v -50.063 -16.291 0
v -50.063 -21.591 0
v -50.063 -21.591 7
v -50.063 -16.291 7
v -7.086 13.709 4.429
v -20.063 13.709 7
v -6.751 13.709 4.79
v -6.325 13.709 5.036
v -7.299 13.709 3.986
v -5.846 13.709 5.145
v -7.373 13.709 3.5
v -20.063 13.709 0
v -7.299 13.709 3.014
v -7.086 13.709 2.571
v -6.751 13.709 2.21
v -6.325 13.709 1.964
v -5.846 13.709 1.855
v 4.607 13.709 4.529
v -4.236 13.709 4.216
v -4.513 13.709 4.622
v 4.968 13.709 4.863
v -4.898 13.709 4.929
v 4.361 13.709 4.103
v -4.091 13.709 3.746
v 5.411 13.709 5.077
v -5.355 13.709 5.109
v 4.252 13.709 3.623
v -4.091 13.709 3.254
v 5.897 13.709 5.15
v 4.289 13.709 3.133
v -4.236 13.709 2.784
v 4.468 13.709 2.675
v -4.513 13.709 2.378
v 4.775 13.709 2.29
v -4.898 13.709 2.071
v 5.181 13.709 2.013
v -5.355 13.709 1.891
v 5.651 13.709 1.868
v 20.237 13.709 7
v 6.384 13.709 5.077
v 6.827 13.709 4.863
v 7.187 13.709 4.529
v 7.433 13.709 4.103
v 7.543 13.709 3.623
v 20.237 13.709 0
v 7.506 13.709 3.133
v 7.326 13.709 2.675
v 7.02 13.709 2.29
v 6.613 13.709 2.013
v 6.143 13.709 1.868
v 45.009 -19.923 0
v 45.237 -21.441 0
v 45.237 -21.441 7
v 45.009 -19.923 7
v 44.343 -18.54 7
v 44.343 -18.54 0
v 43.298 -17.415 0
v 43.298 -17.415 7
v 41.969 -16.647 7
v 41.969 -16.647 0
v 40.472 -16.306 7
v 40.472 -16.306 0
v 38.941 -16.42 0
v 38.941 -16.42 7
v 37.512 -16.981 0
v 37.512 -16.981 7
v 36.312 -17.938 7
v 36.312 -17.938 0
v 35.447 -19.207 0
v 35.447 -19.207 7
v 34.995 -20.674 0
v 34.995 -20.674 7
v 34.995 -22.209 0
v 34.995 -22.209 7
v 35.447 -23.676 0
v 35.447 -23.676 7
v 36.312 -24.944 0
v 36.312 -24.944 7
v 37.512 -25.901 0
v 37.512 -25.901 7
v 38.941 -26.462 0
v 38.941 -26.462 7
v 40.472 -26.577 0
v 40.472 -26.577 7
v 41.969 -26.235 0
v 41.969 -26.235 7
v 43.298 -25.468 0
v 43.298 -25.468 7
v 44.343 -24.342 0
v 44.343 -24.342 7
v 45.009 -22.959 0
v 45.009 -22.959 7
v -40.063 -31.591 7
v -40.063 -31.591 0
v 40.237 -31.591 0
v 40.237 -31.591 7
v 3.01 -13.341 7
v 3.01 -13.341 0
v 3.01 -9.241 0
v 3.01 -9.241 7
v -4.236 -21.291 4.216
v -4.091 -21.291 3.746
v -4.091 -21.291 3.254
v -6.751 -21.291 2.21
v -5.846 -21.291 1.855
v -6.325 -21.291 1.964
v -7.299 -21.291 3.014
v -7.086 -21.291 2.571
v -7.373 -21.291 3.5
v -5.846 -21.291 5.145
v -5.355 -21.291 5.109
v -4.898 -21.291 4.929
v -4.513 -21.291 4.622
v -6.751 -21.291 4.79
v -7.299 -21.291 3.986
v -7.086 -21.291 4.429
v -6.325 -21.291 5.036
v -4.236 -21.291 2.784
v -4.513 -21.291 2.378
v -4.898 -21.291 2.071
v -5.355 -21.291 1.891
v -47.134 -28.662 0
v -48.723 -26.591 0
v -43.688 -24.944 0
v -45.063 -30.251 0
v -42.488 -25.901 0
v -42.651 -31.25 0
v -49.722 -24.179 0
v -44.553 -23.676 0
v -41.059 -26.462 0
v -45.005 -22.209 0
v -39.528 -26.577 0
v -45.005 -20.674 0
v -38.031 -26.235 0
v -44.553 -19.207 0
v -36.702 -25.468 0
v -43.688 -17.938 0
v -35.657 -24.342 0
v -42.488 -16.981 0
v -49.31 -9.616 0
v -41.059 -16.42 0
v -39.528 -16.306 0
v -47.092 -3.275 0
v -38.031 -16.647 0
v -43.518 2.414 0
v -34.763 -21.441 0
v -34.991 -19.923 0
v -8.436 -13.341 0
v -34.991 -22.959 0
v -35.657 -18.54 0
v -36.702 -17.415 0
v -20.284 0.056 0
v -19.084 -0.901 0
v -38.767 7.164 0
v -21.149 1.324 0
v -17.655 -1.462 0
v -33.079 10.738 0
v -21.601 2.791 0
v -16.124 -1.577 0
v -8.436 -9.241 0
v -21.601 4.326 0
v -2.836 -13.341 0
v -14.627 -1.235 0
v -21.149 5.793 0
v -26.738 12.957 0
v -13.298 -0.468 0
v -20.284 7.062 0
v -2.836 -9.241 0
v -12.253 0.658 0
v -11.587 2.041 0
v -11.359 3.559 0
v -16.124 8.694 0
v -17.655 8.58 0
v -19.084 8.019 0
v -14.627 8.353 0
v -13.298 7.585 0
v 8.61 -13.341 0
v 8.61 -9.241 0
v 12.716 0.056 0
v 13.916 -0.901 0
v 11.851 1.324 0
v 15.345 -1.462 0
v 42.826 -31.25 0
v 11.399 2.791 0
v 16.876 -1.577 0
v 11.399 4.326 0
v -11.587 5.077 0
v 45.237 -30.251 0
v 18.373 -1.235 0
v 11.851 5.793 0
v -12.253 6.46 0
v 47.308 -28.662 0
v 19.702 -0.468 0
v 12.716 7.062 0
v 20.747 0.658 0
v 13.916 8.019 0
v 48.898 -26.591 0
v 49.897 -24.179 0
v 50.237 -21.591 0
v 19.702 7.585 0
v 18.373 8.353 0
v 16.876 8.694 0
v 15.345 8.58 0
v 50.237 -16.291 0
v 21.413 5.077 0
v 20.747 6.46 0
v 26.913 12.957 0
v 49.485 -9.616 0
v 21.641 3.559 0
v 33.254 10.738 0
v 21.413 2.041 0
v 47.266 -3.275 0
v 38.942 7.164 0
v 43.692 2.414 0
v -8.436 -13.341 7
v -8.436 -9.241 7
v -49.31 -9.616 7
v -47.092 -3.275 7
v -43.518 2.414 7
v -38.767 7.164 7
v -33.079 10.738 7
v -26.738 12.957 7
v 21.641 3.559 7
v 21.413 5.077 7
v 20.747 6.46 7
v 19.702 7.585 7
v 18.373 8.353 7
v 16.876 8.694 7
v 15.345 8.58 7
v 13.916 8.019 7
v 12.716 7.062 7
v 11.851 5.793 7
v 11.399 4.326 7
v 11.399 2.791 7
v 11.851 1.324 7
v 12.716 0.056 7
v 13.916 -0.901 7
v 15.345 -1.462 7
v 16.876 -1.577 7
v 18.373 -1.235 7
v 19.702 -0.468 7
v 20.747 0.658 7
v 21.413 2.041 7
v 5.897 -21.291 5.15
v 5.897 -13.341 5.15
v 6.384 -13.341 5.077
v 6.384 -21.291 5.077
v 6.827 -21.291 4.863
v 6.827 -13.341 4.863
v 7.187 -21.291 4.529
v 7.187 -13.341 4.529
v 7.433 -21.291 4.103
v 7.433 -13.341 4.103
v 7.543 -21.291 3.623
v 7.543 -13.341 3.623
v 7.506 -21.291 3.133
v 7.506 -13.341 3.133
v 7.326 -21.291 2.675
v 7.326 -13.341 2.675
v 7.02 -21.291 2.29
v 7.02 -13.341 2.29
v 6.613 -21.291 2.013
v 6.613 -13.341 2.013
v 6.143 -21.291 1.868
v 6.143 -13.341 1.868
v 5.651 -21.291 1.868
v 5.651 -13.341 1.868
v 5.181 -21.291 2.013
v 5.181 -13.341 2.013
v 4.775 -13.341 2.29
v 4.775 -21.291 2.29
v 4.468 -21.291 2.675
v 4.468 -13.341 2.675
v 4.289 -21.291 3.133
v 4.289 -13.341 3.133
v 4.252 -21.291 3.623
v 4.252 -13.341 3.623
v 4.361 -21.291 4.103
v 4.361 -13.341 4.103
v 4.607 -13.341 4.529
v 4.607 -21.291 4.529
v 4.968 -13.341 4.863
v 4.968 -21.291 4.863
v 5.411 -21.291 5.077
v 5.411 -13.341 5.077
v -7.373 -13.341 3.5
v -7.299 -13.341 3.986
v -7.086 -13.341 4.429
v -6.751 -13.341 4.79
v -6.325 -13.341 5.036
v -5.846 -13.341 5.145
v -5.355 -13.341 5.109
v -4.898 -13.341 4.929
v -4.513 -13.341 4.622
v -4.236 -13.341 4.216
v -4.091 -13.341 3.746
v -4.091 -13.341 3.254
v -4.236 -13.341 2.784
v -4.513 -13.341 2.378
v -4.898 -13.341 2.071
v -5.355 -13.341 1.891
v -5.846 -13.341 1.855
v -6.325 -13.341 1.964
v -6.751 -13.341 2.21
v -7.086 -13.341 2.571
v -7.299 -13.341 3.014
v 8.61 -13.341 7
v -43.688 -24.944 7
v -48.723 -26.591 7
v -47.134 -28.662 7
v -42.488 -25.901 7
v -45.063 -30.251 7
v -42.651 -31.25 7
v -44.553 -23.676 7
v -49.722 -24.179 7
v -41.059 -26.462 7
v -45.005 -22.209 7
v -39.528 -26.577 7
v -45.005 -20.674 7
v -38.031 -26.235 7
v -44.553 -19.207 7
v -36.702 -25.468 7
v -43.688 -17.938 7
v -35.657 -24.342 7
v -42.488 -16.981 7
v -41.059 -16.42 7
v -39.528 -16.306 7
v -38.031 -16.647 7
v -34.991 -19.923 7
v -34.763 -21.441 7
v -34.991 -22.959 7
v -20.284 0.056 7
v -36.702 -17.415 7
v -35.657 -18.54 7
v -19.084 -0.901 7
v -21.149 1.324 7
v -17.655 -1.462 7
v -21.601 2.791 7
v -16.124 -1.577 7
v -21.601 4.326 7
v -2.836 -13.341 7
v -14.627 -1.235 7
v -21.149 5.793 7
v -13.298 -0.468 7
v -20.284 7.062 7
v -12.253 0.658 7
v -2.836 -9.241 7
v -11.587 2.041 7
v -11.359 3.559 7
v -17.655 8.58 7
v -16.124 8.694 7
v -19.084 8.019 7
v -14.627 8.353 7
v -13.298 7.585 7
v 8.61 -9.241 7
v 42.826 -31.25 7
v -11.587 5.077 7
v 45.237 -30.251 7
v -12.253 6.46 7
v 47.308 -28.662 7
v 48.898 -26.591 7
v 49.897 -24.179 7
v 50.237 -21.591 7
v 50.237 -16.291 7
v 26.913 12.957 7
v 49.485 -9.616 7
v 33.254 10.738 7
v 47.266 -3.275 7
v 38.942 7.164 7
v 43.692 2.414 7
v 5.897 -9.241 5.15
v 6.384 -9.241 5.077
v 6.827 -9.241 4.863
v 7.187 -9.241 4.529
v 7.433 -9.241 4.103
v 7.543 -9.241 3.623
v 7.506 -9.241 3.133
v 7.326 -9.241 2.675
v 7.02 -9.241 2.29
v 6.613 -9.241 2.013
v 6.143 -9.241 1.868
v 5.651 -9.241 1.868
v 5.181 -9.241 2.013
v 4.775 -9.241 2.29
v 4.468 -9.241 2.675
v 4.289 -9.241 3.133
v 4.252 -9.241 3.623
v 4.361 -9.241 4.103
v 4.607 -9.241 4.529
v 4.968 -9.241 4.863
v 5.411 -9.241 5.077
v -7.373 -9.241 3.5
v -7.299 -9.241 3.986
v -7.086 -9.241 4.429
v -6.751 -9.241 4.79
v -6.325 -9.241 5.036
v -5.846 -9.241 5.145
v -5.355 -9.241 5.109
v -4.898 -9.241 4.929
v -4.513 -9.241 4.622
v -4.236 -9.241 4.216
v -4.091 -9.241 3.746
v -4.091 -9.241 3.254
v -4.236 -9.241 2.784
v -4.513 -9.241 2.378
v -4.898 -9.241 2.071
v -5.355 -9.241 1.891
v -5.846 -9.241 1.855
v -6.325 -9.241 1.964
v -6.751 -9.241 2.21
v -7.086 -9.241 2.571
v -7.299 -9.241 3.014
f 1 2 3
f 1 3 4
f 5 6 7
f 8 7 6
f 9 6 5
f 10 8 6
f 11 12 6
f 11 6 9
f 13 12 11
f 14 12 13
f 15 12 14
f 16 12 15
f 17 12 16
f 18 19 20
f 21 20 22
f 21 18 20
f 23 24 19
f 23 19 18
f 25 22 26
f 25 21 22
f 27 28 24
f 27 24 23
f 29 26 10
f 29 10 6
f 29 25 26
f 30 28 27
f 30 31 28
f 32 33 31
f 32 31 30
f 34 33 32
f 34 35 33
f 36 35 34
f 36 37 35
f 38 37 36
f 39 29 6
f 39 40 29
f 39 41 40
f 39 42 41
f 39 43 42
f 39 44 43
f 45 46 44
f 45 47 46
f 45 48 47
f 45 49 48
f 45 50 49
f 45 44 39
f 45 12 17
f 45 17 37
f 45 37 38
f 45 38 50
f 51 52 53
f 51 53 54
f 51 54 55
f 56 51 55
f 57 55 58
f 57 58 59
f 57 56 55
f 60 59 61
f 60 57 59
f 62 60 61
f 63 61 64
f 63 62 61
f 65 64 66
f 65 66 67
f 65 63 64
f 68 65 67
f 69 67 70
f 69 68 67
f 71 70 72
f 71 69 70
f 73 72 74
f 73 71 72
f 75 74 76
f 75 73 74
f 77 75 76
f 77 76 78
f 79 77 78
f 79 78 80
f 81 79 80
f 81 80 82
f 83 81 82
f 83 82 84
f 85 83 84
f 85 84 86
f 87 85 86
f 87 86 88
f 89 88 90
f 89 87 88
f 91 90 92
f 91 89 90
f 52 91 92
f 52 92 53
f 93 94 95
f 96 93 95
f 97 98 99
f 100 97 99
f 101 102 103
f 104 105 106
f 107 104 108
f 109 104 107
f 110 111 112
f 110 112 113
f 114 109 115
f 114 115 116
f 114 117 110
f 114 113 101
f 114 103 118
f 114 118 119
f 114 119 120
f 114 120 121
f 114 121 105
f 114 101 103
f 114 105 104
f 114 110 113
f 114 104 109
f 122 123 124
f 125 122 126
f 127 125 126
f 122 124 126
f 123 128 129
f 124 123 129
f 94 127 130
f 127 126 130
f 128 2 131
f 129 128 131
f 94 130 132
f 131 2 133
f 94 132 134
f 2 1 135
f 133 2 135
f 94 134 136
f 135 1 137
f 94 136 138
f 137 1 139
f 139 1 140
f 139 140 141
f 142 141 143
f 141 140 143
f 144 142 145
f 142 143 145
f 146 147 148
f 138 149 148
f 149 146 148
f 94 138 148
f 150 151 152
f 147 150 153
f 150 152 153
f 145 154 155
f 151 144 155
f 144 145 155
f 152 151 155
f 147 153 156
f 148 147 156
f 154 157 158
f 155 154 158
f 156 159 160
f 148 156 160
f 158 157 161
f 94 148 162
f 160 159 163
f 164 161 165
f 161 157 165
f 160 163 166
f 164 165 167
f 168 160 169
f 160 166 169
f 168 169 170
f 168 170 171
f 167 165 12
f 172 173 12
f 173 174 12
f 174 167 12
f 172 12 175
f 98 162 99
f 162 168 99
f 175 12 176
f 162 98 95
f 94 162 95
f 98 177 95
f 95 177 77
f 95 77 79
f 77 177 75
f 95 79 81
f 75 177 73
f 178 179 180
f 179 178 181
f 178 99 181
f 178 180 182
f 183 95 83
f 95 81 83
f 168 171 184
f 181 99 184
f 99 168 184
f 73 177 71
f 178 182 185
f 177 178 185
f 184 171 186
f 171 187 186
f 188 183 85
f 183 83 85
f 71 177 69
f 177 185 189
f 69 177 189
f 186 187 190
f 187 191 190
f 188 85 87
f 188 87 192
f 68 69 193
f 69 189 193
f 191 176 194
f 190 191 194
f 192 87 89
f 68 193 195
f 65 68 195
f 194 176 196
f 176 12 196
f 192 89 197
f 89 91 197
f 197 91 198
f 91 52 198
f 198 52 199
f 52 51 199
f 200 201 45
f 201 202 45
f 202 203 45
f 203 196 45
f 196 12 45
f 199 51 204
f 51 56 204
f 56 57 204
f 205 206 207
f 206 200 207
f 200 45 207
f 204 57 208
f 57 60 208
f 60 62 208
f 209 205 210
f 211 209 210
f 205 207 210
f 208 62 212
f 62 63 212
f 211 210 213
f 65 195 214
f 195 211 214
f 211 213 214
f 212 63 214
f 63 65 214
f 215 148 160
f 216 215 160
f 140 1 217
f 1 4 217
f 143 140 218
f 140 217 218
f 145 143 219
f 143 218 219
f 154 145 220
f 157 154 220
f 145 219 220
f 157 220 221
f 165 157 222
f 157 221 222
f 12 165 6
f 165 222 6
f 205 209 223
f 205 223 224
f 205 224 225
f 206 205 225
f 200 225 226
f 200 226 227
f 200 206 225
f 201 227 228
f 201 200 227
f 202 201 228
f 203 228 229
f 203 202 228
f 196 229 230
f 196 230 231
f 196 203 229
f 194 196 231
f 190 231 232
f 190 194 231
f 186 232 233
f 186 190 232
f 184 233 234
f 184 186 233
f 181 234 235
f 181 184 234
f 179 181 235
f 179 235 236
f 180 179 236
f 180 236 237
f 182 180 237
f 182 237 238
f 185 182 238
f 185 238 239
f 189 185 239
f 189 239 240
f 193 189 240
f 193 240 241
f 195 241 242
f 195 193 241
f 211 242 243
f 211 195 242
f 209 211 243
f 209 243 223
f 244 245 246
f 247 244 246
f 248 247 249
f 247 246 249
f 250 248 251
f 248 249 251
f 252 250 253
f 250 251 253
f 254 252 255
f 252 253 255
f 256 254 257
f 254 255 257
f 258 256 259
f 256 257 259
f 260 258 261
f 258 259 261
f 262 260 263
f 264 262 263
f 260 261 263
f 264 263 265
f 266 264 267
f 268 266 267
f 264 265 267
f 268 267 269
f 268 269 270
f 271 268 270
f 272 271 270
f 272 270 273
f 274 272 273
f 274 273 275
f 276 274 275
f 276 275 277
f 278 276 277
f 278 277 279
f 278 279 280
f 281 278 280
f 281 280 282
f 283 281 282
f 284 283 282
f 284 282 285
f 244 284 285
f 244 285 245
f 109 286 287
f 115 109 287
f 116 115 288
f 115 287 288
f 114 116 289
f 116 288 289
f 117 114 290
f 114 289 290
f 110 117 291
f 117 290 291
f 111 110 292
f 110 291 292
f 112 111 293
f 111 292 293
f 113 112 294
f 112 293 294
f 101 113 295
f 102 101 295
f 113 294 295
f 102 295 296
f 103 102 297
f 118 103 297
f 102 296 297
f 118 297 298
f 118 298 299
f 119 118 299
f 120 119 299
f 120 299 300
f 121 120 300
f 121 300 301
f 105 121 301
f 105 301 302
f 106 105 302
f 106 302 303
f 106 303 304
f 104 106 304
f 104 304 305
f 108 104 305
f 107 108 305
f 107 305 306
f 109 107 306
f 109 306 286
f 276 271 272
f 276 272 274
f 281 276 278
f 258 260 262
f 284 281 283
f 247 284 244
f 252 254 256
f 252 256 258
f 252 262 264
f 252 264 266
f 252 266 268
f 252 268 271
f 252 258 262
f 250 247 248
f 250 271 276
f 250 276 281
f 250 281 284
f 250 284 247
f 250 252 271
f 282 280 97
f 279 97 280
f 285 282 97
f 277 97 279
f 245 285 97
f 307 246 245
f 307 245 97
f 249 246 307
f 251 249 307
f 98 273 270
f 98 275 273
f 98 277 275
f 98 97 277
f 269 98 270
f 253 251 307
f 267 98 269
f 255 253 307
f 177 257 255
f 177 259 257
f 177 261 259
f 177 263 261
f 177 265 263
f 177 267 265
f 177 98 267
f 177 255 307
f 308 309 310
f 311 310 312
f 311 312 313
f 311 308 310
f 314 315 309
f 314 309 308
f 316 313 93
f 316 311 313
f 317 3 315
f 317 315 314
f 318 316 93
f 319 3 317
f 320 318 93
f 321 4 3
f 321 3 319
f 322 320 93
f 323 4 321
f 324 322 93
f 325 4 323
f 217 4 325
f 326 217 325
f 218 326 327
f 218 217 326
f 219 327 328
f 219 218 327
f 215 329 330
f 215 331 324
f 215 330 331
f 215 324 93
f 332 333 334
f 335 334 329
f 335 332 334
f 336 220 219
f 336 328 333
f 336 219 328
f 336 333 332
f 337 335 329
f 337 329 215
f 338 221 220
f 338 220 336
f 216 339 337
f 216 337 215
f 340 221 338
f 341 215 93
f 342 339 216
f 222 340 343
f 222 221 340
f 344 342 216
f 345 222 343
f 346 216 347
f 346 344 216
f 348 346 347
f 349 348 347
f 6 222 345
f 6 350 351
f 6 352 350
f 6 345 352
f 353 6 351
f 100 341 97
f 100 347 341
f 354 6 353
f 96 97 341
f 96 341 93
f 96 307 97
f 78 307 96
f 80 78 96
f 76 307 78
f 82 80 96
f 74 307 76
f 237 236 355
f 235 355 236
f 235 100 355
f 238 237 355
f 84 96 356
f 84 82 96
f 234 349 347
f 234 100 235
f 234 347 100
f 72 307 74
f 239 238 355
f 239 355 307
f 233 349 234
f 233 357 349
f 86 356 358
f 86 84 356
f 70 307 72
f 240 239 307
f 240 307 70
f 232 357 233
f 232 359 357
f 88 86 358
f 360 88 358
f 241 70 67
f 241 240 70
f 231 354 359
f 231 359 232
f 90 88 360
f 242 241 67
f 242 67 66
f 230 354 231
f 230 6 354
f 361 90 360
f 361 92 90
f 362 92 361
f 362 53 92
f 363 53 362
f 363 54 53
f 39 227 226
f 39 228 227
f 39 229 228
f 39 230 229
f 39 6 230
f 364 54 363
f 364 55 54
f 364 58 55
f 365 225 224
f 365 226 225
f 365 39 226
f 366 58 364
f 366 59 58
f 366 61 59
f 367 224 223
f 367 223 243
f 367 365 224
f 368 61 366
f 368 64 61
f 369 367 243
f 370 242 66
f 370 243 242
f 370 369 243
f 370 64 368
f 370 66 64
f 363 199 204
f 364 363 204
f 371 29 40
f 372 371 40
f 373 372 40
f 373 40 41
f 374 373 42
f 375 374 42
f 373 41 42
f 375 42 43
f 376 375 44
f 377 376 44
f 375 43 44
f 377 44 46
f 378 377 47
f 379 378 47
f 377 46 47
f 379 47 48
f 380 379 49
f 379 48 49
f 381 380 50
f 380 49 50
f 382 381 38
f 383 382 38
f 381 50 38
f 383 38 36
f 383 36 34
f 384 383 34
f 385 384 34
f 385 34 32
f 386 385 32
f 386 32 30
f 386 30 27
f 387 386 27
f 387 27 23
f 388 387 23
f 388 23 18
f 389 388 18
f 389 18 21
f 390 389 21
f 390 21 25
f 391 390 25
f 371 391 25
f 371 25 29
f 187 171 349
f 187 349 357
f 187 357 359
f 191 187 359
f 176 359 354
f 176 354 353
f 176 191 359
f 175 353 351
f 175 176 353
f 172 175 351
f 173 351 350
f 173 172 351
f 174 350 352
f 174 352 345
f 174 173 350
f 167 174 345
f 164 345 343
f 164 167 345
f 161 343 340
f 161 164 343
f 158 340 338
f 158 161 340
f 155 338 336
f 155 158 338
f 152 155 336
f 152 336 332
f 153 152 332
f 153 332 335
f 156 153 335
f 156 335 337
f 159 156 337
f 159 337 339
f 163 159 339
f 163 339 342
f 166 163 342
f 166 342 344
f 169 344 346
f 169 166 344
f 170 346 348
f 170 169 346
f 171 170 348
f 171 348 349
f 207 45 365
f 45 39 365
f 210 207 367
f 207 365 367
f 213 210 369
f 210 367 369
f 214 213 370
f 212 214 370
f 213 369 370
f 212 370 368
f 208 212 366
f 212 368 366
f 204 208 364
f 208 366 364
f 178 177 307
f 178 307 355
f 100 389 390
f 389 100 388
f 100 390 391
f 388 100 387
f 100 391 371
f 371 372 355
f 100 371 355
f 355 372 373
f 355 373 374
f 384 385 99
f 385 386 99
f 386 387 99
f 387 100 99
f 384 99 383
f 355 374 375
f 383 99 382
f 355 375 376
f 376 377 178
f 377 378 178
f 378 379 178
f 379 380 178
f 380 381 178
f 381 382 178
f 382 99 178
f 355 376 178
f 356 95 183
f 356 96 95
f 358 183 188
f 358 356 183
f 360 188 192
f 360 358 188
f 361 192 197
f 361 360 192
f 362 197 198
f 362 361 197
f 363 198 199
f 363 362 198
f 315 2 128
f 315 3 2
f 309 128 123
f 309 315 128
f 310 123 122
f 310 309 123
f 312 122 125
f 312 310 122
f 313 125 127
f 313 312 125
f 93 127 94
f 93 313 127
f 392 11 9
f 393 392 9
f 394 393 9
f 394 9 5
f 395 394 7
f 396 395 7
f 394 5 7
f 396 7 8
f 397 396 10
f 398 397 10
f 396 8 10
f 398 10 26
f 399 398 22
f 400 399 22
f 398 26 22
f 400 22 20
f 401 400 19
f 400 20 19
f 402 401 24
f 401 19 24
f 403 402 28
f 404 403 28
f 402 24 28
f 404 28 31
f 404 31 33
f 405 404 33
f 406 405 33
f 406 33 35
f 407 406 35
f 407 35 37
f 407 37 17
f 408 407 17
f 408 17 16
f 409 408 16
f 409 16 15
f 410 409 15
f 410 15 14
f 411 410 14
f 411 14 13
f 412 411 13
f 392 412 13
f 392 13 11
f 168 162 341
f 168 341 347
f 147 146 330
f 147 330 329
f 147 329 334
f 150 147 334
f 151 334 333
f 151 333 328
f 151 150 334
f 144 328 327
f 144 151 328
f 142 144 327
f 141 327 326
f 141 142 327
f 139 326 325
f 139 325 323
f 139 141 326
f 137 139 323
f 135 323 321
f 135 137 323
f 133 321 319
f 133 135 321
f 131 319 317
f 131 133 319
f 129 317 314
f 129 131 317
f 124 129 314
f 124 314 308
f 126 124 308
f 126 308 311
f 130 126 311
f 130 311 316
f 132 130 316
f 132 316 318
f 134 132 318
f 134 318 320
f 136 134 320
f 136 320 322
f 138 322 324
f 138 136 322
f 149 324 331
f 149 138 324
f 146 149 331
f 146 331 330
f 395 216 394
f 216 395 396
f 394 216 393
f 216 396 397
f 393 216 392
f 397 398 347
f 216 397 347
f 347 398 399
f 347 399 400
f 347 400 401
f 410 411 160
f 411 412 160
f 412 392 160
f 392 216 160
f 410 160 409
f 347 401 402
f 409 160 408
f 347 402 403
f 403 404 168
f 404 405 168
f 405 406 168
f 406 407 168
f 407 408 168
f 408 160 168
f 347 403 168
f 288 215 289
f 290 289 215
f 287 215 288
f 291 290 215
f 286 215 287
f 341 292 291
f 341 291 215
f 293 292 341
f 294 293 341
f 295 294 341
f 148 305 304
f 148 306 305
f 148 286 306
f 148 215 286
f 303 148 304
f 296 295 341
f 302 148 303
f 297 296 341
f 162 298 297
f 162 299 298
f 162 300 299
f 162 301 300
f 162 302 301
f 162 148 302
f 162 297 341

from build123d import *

# Parameters (mm, degrees)
ESBO_O1_W                = 100.3
ESBO_O1_H                = 45.3
ESBO_O1_R                = 5.15
ESBO_O1_W_2              = 5.6
ESBO_O1_H_2              = 4.1
RESSALTO_EXTRUS_O1_DEPTH = 7
ESBO_O2_R                = 1.65
CORTE_EXTRUS_O1_DEPTH    = 35
FILETE1_R                = 10
FILETE2_R                = 30


with BuildPart() as part:
    # Esboço1 → Ressalto-extrusão1 (new body)
    with BuildSketch(Plane.XY):
        with Locations((0.087398189, -8.941132561)):
            Rectangle(ESBO_O1_W, ESBO_O1_H)
        with Locations((-16.508590221, 3.558867439)):
            Circle(ESBO_O1_R, mode=Mode.SUBTRACT)
        with Locations((16.491409779, 3.558867439)):
            Circle(ESBO_O1_R, mode=Mode.SUBTRACT)
        with Locations((-39.912601811, -21.441132561)):
            Circle(ESBO_O1_R, mode=Mode.SUBTRACT)
        with Locations((40.087398189, -21.441132561)):
            Circle(ESBO_O1_R, mode=Mode.SUBTRACT)
        with Locations((-5.635596016, -11.291132561)):
            Rectangle(ESBO_O1_W_2, ESBO_O1_H_2, mode=Mode.SUBTRACT)
        with Locations((5.810392394, -11.291132561)):
            Rectangle(ESBO_O1_W_2, ESBO_O1_H_2, mode=Mode.SUBTRACT)
    extrude(amount=RESSALTO_EXTRUS_O1_DEPTH)

    # Esboço2 → Corte-extrusão1 (cut)
    with BuildSketch(Plane(origin=(0, 13.708867439, 0), x_dir=(1, 0, 0), z_dir=(0, 1, 0))):
        with Locations(Location((-5.722601811, -3.5, 0), (0, 0, 180))):
            Circle(ESBO_O2_R)
        with Locations(Location((5.897398189, -3.5, 0), (0, 0, 270))):
            Circle(ESBO_O2_R)
    extrude(amount=-CORTE_EXTRUS_O1_DEPTH, mode=Mode.SUBTRACT)

    # Filete1
    filete1_edges = [part.edges().sort_by_distance(p)[0] for p in [
        (50.237398189, -31.591132561, 3.5),
        (-50.062601811, -31.591132561, 3.5),
    ]]
    fillet(filete1_edges, radius=FILETE1_R)

    # Filete2
    filete2_edges = [part.edges().sort_by_distance(p)[0] for p in [
        (-50.062601811, 13.708867439, 3.5),
        (50.237398189, 13.708867439, 3.5),
    ]]
    fillet(filete2_edges, radius=FILETE2_R)


solid = part.part
